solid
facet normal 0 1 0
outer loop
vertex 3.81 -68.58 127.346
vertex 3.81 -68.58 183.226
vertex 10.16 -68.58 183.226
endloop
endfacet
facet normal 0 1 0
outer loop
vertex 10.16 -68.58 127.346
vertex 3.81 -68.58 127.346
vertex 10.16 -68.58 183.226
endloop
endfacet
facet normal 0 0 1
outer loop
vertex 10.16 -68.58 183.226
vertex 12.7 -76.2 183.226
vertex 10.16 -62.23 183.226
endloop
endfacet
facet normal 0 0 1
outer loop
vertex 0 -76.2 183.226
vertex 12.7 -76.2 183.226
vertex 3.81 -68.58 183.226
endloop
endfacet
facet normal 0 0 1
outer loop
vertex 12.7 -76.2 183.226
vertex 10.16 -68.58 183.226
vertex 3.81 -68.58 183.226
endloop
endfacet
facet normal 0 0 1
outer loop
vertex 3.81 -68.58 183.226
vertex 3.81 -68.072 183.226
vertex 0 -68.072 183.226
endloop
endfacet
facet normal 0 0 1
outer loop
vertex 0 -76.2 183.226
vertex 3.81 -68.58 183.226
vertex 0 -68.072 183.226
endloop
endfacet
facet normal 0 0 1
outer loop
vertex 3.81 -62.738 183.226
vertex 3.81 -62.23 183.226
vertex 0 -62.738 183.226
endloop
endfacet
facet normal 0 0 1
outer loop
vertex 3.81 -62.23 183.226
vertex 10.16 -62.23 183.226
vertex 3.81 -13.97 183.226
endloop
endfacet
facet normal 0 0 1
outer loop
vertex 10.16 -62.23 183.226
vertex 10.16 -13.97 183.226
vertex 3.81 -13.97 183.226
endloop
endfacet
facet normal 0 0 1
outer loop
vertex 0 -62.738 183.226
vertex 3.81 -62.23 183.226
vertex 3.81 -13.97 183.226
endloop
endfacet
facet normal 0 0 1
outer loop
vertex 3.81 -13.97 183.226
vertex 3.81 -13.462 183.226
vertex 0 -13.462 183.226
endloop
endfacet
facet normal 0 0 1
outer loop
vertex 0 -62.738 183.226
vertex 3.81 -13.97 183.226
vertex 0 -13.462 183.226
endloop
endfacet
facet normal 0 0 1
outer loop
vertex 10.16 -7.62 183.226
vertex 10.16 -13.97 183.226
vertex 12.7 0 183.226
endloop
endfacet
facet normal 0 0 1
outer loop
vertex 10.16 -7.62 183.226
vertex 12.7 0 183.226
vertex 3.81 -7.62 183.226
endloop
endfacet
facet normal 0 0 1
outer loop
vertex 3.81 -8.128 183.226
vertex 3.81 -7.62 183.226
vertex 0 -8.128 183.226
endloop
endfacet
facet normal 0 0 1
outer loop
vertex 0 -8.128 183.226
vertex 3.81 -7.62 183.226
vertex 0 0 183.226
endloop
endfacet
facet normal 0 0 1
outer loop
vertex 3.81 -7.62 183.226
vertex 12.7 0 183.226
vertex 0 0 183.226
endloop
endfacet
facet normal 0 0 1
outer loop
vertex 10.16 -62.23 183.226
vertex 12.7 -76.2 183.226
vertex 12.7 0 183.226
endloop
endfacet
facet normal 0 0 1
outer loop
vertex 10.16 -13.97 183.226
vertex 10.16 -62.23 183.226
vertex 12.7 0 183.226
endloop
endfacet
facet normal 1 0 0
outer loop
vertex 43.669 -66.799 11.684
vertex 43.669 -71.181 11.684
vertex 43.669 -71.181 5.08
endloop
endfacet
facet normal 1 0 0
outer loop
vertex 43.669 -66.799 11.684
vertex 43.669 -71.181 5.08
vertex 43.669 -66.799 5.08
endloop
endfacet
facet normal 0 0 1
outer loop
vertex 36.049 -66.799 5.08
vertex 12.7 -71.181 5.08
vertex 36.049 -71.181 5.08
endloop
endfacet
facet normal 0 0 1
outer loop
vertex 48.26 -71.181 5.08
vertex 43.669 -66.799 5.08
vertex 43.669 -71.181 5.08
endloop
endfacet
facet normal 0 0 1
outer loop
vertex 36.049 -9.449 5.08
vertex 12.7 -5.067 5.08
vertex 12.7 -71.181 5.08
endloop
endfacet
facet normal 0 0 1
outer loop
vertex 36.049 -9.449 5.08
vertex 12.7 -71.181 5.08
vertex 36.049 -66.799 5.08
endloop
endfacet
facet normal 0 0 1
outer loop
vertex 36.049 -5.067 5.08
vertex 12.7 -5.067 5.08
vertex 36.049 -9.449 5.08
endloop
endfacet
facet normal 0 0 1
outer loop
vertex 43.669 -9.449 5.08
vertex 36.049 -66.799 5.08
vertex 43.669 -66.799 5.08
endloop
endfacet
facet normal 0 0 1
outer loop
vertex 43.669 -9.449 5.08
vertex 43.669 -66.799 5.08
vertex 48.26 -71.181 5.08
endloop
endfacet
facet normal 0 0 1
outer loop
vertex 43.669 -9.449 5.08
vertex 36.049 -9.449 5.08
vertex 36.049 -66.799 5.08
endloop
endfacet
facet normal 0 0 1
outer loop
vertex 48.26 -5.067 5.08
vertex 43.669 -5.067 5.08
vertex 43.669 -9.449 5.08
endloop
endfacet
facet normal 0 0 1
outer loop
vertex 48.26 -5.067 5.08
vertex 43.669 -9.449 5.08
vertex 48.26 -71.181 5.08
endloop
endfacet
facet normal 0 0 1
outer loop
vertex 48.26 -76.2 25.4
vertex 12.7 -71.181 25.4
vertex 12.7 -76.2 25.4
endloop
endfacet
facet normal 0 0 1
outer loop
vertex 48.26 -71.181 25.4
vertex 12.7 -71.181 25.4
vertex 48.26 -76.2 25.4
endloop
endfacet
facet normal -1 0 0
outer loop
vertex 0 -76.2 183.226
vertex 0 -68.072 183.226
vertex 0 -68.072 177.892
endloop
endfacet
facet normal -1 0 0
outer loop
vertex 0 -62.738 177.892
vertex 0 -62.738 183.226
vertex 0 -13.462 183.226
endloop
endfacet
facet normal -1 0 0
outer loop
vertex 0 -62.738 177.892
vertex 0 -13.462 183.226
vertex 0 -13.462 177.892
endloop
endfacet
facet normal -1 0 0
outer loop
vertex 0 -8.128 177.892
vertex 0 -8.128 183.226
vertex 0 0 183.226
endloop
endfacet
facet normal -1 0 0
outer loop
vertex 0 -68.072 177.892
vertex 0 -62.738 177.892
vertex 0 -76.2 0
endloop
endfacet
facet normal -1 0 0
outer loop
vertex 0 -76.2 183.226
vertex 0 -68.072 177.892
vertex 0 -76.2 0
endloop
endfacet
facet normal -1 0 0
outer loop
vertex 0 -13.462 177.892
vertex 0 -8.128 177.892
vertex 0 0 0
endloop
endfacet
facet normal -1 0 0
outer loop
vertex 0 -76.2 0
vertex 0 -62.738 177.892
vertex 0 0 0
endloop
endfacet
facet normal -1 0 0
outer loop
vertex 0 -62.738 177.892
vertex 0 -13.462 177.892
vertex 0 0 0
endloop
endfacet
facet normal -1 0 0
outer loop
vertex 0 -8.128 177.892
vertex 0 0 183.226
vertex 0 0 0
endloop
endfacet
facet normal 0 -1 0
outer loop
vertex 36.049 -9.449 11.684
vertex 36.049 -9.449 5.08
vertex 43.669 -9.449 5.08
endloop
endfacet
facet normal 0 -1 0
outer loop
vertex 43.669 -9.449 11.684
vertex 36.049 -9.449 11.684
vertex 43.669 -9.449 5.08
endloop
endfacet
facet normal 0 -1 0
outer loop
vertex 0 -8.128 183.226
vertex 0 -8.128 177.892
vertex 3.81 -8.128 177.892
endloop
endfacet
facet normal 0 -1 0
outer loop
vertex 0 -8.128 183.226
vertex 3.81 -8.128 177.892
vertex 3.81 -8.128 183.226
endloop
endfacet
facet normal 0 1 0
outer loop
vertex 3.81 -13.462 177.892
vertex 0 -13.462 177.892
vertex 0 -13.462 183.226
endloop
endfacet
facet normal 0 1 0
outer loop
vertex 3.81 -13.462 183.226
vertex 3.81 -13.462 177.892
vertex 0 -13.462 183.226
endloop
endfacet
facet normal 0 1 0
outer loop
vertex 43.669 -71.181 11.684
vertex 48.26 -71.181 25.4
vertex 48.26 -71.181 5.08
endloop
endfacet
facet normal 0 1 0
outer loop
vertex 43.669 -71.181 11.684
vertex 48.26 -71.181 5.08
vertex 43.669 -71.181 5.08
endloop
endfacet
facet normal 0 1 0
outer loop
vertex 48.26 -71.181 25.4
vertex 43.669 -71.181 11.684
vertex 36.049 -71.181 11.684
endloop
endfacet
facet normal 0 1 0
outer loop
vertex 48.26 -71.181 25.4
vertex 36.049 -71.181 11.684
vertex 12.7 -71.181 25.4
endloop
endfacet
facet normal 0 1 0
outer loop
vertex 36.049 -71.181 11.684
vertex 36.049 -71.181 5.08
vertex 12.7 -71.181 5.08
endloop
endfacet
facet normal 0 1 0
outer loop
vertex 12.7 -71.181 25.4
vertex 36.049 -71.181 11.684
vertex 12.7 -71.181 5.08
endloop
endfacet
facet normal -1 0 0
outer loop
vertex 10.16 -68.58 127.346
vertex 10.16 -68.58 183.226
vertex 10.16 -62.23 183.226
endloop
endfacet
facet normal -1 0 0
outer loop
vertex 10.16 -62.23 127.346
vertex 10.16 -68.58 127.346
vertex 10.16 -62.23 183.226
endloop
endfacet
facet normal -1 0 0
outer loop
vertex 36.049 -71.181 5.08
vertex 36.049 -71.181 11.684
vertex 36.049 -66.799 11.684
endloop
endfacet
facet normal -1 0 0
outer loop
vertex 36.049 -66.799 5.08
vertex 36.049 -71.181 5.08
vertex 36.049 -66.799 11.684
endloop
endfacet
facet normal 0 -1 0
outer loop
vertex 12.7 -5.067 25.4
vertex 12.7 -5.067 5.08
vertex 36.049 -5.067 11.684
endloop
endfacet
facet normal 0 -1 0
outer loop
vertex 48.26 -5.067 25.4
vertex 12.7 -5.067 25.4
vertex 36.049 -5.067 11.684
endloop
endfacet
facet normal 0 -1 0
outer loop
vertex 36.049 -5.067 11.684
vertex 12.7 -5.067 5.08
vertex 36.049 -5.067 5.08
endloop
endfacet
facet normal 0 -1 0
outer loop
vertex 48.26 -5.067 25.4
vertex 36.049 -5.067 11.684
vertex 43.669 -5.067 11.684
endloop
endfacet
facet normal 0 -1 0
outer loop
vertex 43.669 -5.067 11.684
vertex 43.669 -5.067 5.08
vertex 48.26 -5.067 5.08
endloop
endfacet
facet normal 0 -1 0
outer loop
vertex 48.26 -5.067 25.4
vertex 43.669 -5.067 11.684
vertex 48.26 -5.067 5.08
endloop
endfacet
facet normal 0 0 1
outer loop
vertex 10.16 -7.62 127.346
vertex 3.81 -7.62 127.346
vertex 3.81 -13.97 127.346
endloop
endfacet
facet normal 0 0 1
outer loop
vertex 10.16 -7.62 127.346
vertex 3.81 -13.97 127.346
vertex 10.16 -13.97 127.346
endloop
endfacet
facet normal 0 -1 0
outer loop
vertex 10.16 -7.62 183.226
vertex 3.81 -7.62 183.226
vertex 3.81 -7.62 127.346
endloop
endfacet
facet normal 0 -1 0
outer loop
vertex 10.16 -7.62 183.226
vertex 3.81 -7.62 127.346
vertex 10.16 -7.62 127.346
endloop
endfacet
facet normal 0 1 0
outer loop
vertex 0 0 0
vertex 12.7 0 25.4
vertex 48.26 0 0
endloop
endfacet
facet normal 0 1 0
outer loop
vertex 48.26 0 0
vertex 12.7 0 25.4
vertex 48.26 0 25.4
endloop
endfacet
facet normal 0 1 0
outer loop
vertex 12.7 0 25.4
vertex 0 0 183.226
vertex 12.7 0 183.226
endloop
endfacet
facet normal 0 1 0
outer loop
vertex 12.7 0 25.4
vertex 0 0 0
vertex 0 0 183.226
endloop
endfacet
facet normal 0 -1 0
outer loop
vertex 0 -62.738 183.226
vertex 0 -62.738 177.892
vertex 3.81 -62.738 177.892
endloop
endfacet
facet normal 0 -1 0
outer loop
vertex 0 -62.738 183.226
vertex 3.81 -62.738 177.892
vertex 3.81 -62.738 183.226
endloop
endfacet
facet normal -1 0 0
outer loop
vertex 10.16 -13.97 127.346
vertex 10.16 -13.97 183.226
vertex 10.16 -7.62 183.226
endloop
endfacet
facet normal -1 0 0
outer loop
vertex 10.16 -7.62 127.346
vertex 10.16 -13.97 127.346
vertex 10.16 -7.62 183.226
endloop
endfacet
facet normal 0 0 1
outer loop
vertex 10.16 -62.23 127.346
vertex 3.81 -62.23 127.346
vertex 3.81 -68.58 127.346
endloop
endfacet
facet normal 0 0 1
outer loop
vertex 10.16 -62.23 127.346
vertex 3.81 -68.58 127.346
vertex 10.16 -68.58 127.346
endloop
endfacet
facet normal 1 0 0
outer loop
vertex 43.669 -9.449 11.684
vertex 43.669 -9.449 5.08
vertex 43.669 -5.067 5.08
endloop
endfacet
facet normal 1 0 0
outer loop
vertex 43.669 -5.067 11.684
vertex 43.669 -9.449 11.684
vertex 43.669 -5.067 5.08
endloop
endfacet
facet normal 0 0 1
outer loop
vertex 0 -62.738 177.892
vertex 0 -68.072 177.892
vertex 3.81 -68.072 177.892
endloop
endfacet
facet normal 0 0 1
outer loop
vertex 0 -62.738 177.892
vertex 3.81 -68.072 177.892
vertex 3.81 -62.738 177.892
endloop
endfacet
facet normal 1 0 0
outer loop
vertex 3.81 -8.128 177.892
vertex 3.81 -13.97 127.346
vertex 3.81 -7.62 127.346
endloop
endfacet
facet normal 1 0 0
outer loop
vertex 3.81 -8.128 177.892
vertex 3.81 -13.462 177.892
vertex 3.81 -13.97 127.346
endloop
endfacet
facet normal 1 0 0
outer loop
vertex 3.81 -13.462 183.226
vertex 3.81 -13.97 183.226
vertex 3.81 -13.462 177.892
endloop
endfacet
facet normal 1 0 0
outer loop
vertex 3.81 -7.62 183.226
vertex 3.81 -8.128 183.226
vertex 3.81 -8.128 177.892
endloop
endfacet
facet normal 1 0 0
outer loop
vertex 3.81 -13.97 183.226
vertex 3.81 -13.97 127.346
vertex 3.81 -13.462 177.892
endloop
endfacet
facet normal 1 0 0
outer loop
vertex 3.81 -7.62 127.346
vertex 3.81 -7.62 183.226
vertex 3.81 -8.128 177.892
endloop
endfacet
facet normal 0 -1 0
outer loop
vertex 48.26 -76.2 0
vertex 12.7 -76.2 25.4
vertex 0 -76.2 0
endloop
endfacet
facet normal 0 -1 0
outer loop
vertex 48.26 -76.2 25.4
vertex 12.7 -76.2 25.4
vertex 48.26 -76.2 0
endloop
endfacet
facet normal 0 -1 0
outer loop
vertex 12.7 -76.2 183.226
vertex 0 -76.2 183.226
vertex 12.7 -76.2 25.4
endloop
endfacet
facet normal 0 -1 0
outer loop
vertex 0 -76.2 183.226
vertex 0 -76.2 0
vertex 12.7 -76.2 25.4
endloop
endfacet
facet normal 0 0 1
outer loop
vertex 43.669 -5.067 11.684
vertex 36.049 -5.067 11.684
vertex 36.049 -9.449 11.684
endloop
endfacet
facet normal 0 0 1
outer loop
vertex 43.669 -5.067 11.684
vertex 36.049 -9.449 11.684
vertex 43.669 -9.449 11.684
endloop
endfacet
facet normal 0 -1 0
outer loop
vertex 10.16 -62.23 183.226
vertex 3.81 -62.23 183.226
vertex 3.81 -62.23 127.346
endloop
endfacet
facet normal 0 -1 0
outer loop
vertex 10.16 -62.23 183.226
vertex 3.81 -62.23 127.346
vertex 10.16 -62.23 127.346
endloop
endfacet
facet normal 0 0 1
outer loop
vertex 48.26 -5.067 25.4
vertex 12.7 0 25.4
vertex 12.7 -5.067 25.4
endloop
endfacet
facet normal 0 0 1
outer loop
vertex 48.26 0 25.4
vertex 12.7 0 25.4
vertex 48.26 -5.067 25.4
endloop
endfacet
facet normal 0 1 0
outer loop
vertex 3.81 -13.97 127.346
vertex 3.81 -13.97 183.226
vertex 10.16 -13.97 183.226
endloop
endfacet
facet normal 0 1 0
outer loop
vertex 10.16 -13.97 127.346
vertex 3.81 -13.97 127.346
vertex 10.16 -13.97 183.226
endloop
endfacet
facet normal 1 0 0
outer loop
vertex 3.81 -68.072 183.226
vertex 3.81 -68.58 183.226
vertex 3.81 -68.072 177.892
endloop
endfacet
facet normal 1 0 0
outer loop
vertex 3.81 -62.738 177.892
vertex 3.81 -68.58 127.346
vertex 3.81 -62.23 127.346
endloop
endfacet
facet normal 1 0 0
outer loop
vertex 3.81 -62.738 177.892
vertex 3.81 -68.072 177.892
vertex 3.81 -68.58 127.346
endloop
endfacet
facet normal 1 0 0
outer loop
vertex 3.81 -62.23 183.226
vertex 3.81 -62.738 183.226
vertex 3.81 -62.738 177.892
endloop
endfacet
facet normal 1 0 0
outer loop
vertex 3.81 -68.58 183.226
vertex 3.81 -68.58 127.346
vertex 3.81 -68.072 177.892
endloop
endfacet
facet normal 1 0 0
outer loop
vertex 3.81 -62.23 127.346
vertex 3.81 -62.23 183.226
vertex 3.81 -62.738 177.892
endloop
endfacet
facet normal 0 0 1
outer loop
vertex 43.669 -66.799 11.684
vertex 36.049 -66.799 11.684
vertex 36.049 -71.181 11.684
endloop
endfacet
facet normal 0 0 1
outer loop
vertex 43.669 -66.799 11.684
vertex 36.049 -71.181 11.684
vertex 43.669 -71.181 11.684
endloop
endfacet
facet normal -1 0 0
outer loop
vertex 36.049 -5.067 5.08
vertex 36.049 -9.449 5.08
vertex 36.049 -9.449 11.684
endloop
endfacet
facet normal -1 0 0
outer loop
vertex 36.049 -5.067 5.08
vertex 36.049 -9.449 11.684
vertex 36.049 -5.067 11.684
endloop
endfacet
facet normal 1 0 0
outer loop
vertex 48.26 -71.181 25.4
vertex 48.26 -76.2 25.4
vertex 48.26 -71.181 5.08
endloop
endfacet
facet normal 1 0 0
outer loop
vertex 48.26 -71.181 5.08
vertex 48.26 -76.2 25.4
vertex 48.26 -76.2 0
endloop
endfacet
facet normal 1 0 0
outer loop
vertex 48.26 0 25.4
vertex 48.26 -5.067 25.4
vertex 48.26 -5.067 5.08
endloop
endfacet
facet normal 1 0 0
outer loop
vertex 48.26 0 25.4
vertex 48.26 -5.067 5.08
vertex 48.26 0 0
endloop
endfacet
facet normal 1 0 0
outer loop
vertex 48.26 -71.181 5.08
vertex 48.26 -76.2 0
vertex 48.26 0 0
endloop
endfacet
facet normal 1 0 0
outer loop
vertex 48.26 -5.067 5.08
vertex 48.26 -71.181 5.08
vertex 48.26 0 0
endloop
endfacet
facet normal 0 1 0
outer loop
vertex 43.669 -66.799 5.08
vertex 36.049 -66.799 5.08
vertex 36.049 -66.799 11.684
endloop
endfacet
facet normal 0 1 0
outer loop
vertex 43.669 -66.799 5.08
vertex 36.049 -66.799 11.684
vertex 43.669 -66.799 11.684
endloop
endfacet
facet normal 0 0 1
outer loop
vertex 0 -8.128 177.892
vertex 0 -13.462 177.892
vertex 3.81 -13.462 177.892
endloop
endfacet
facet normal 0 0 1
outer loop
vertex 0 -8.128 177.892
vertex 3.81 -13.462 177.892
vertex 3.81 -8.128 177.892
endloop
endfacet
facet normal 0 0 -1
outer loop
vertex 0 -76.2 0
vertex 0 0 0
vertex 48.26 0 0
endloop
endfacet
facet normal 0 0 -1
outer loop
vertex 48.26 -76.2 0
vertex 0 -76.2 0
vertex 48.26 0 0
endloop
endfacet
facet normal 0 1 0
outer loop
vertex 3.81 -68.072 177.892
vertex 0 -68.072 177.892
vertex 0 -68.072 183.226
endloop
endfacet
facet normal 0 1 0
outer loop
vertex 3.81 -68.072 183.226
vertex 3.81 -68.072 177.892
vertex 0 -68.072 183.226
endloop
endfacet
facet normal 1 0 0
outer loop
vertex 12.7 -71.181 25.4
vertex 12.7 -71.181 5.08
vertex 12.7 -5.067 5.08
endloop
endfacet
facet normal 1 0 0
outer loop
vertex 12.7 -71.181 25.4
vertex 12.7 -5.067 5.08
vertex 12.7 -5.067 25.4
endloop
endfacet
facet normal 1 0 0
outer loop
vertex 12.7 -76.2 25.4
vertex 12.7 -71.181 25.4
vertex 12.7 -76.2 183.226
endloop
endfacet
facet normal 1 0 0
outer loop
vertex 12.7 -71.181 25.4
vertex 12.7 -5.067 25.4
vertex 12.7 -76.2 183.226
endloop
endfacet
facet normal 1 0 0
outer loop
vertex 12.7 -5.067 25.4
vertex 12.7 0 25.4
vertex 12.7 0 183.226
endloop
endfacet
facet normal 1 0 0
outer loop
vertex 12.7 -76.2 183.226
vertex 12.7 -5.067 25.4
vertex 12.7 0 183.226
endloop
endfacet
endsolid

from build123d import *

# Parameters (mm, degrees)
F1_DEPTH  = 76.2
F3_DEPTH  = 25.4
F4_DEPTH  = 5.08
F5_W      = 7.62
F5_H      = 4.3815
F6_DEPTH  = 11.684
F7_W      = 6.35
F7_H      = 6.35
F8_DEPTH  = 55.88
F9_W      = 5.334
F9_H      = 5.334
F10_DEPTH = 5.08


# Not quite as in the source:
# - a feature names something its author has since deleted; it is built from what else it names


with BuildPart() as f1:
    # F0 (on Front) → F1 (new body)
    with BuildSketch(Plane.XZ):
        Polygon((0, 0), (12.7, 0), (12.7, 5.4184001555), (12.7, 23.5612627981), (12.7, 183.226400471), (0, 183.226400471), align=None)
    extrude(amount=F1_DEPTH)

    # F2 (on Top) → F3 (join)
    with BuildSketch(Plane.XY):
        Polygon((43.18, 0), (0, 0), (0, -5.0670392811), (48.26, -5.0670392811), (48.26, 0), align=None)
        Polygon((27.7881938964, -71.1809098721), (0, -71.1809098721), (0, -76.2), (30.48, -76.2), (48.26, -76.2), (48.26, -71.1809098721), (35.56, -71.1809098721), align=None)
    extrude(amount=F3_DEPTH)

    # F2 (on Top) → F4 (join)
    with BuildSketch(Plane.XY):
        Polygon((43.18, 0), (0, 0), (0, -5.0670392811), (48.26, -5.0670392811), (48.26, 0), align=None)
        Polygon((48.26, -5.0670392811), (0, -5.0670392811), (0, -71.1809098721), (27.7881938964, -71.1809098721), (35.56, -71.1809098721), (48.26, -71.1809098721), align=None)
    extrude(amount=F4_DEPTH)

    # F5 (on Top) → F6 (join)
    with BuildSketch(Plane.XY):
        with Locations((39.8590039933, -7.2577892811)):
            Rectangle(F5_W, F5_H)
        with Locations((39.8590039933, -68.9901598721)):
            Rectangle(F5_W, F5_H)
    extrude(amount=F6_DEPTH)

    # F7 (on face) → F8 (cut)
    with BuildSketch(Plane.XY.offset(183.226400471)):
        with Locations((6.985, -10.795)):
            Rectangle(F7_W, F7_H)
        with Locations((6.985, -65.405)):
            Rectangle(F7_W, F7_H)
    extrude(amount=-F8_DEPTH, mode=Mode.SUBTRACT)

    # F9 (on Right) → F10 (cut)
    with BuildSketch(Plane.YZ):
        with Locations((-65.405, 180.559400471)):
            Rectangle(F9_W, F9_H)
        with Locations((-10.795, 180.559400471)):
            Rectangle(F9_W, F9_H)
    extrude(amount=F10_DEPTH, mode=Mode.SUBTRACT)


solid = f1.part
